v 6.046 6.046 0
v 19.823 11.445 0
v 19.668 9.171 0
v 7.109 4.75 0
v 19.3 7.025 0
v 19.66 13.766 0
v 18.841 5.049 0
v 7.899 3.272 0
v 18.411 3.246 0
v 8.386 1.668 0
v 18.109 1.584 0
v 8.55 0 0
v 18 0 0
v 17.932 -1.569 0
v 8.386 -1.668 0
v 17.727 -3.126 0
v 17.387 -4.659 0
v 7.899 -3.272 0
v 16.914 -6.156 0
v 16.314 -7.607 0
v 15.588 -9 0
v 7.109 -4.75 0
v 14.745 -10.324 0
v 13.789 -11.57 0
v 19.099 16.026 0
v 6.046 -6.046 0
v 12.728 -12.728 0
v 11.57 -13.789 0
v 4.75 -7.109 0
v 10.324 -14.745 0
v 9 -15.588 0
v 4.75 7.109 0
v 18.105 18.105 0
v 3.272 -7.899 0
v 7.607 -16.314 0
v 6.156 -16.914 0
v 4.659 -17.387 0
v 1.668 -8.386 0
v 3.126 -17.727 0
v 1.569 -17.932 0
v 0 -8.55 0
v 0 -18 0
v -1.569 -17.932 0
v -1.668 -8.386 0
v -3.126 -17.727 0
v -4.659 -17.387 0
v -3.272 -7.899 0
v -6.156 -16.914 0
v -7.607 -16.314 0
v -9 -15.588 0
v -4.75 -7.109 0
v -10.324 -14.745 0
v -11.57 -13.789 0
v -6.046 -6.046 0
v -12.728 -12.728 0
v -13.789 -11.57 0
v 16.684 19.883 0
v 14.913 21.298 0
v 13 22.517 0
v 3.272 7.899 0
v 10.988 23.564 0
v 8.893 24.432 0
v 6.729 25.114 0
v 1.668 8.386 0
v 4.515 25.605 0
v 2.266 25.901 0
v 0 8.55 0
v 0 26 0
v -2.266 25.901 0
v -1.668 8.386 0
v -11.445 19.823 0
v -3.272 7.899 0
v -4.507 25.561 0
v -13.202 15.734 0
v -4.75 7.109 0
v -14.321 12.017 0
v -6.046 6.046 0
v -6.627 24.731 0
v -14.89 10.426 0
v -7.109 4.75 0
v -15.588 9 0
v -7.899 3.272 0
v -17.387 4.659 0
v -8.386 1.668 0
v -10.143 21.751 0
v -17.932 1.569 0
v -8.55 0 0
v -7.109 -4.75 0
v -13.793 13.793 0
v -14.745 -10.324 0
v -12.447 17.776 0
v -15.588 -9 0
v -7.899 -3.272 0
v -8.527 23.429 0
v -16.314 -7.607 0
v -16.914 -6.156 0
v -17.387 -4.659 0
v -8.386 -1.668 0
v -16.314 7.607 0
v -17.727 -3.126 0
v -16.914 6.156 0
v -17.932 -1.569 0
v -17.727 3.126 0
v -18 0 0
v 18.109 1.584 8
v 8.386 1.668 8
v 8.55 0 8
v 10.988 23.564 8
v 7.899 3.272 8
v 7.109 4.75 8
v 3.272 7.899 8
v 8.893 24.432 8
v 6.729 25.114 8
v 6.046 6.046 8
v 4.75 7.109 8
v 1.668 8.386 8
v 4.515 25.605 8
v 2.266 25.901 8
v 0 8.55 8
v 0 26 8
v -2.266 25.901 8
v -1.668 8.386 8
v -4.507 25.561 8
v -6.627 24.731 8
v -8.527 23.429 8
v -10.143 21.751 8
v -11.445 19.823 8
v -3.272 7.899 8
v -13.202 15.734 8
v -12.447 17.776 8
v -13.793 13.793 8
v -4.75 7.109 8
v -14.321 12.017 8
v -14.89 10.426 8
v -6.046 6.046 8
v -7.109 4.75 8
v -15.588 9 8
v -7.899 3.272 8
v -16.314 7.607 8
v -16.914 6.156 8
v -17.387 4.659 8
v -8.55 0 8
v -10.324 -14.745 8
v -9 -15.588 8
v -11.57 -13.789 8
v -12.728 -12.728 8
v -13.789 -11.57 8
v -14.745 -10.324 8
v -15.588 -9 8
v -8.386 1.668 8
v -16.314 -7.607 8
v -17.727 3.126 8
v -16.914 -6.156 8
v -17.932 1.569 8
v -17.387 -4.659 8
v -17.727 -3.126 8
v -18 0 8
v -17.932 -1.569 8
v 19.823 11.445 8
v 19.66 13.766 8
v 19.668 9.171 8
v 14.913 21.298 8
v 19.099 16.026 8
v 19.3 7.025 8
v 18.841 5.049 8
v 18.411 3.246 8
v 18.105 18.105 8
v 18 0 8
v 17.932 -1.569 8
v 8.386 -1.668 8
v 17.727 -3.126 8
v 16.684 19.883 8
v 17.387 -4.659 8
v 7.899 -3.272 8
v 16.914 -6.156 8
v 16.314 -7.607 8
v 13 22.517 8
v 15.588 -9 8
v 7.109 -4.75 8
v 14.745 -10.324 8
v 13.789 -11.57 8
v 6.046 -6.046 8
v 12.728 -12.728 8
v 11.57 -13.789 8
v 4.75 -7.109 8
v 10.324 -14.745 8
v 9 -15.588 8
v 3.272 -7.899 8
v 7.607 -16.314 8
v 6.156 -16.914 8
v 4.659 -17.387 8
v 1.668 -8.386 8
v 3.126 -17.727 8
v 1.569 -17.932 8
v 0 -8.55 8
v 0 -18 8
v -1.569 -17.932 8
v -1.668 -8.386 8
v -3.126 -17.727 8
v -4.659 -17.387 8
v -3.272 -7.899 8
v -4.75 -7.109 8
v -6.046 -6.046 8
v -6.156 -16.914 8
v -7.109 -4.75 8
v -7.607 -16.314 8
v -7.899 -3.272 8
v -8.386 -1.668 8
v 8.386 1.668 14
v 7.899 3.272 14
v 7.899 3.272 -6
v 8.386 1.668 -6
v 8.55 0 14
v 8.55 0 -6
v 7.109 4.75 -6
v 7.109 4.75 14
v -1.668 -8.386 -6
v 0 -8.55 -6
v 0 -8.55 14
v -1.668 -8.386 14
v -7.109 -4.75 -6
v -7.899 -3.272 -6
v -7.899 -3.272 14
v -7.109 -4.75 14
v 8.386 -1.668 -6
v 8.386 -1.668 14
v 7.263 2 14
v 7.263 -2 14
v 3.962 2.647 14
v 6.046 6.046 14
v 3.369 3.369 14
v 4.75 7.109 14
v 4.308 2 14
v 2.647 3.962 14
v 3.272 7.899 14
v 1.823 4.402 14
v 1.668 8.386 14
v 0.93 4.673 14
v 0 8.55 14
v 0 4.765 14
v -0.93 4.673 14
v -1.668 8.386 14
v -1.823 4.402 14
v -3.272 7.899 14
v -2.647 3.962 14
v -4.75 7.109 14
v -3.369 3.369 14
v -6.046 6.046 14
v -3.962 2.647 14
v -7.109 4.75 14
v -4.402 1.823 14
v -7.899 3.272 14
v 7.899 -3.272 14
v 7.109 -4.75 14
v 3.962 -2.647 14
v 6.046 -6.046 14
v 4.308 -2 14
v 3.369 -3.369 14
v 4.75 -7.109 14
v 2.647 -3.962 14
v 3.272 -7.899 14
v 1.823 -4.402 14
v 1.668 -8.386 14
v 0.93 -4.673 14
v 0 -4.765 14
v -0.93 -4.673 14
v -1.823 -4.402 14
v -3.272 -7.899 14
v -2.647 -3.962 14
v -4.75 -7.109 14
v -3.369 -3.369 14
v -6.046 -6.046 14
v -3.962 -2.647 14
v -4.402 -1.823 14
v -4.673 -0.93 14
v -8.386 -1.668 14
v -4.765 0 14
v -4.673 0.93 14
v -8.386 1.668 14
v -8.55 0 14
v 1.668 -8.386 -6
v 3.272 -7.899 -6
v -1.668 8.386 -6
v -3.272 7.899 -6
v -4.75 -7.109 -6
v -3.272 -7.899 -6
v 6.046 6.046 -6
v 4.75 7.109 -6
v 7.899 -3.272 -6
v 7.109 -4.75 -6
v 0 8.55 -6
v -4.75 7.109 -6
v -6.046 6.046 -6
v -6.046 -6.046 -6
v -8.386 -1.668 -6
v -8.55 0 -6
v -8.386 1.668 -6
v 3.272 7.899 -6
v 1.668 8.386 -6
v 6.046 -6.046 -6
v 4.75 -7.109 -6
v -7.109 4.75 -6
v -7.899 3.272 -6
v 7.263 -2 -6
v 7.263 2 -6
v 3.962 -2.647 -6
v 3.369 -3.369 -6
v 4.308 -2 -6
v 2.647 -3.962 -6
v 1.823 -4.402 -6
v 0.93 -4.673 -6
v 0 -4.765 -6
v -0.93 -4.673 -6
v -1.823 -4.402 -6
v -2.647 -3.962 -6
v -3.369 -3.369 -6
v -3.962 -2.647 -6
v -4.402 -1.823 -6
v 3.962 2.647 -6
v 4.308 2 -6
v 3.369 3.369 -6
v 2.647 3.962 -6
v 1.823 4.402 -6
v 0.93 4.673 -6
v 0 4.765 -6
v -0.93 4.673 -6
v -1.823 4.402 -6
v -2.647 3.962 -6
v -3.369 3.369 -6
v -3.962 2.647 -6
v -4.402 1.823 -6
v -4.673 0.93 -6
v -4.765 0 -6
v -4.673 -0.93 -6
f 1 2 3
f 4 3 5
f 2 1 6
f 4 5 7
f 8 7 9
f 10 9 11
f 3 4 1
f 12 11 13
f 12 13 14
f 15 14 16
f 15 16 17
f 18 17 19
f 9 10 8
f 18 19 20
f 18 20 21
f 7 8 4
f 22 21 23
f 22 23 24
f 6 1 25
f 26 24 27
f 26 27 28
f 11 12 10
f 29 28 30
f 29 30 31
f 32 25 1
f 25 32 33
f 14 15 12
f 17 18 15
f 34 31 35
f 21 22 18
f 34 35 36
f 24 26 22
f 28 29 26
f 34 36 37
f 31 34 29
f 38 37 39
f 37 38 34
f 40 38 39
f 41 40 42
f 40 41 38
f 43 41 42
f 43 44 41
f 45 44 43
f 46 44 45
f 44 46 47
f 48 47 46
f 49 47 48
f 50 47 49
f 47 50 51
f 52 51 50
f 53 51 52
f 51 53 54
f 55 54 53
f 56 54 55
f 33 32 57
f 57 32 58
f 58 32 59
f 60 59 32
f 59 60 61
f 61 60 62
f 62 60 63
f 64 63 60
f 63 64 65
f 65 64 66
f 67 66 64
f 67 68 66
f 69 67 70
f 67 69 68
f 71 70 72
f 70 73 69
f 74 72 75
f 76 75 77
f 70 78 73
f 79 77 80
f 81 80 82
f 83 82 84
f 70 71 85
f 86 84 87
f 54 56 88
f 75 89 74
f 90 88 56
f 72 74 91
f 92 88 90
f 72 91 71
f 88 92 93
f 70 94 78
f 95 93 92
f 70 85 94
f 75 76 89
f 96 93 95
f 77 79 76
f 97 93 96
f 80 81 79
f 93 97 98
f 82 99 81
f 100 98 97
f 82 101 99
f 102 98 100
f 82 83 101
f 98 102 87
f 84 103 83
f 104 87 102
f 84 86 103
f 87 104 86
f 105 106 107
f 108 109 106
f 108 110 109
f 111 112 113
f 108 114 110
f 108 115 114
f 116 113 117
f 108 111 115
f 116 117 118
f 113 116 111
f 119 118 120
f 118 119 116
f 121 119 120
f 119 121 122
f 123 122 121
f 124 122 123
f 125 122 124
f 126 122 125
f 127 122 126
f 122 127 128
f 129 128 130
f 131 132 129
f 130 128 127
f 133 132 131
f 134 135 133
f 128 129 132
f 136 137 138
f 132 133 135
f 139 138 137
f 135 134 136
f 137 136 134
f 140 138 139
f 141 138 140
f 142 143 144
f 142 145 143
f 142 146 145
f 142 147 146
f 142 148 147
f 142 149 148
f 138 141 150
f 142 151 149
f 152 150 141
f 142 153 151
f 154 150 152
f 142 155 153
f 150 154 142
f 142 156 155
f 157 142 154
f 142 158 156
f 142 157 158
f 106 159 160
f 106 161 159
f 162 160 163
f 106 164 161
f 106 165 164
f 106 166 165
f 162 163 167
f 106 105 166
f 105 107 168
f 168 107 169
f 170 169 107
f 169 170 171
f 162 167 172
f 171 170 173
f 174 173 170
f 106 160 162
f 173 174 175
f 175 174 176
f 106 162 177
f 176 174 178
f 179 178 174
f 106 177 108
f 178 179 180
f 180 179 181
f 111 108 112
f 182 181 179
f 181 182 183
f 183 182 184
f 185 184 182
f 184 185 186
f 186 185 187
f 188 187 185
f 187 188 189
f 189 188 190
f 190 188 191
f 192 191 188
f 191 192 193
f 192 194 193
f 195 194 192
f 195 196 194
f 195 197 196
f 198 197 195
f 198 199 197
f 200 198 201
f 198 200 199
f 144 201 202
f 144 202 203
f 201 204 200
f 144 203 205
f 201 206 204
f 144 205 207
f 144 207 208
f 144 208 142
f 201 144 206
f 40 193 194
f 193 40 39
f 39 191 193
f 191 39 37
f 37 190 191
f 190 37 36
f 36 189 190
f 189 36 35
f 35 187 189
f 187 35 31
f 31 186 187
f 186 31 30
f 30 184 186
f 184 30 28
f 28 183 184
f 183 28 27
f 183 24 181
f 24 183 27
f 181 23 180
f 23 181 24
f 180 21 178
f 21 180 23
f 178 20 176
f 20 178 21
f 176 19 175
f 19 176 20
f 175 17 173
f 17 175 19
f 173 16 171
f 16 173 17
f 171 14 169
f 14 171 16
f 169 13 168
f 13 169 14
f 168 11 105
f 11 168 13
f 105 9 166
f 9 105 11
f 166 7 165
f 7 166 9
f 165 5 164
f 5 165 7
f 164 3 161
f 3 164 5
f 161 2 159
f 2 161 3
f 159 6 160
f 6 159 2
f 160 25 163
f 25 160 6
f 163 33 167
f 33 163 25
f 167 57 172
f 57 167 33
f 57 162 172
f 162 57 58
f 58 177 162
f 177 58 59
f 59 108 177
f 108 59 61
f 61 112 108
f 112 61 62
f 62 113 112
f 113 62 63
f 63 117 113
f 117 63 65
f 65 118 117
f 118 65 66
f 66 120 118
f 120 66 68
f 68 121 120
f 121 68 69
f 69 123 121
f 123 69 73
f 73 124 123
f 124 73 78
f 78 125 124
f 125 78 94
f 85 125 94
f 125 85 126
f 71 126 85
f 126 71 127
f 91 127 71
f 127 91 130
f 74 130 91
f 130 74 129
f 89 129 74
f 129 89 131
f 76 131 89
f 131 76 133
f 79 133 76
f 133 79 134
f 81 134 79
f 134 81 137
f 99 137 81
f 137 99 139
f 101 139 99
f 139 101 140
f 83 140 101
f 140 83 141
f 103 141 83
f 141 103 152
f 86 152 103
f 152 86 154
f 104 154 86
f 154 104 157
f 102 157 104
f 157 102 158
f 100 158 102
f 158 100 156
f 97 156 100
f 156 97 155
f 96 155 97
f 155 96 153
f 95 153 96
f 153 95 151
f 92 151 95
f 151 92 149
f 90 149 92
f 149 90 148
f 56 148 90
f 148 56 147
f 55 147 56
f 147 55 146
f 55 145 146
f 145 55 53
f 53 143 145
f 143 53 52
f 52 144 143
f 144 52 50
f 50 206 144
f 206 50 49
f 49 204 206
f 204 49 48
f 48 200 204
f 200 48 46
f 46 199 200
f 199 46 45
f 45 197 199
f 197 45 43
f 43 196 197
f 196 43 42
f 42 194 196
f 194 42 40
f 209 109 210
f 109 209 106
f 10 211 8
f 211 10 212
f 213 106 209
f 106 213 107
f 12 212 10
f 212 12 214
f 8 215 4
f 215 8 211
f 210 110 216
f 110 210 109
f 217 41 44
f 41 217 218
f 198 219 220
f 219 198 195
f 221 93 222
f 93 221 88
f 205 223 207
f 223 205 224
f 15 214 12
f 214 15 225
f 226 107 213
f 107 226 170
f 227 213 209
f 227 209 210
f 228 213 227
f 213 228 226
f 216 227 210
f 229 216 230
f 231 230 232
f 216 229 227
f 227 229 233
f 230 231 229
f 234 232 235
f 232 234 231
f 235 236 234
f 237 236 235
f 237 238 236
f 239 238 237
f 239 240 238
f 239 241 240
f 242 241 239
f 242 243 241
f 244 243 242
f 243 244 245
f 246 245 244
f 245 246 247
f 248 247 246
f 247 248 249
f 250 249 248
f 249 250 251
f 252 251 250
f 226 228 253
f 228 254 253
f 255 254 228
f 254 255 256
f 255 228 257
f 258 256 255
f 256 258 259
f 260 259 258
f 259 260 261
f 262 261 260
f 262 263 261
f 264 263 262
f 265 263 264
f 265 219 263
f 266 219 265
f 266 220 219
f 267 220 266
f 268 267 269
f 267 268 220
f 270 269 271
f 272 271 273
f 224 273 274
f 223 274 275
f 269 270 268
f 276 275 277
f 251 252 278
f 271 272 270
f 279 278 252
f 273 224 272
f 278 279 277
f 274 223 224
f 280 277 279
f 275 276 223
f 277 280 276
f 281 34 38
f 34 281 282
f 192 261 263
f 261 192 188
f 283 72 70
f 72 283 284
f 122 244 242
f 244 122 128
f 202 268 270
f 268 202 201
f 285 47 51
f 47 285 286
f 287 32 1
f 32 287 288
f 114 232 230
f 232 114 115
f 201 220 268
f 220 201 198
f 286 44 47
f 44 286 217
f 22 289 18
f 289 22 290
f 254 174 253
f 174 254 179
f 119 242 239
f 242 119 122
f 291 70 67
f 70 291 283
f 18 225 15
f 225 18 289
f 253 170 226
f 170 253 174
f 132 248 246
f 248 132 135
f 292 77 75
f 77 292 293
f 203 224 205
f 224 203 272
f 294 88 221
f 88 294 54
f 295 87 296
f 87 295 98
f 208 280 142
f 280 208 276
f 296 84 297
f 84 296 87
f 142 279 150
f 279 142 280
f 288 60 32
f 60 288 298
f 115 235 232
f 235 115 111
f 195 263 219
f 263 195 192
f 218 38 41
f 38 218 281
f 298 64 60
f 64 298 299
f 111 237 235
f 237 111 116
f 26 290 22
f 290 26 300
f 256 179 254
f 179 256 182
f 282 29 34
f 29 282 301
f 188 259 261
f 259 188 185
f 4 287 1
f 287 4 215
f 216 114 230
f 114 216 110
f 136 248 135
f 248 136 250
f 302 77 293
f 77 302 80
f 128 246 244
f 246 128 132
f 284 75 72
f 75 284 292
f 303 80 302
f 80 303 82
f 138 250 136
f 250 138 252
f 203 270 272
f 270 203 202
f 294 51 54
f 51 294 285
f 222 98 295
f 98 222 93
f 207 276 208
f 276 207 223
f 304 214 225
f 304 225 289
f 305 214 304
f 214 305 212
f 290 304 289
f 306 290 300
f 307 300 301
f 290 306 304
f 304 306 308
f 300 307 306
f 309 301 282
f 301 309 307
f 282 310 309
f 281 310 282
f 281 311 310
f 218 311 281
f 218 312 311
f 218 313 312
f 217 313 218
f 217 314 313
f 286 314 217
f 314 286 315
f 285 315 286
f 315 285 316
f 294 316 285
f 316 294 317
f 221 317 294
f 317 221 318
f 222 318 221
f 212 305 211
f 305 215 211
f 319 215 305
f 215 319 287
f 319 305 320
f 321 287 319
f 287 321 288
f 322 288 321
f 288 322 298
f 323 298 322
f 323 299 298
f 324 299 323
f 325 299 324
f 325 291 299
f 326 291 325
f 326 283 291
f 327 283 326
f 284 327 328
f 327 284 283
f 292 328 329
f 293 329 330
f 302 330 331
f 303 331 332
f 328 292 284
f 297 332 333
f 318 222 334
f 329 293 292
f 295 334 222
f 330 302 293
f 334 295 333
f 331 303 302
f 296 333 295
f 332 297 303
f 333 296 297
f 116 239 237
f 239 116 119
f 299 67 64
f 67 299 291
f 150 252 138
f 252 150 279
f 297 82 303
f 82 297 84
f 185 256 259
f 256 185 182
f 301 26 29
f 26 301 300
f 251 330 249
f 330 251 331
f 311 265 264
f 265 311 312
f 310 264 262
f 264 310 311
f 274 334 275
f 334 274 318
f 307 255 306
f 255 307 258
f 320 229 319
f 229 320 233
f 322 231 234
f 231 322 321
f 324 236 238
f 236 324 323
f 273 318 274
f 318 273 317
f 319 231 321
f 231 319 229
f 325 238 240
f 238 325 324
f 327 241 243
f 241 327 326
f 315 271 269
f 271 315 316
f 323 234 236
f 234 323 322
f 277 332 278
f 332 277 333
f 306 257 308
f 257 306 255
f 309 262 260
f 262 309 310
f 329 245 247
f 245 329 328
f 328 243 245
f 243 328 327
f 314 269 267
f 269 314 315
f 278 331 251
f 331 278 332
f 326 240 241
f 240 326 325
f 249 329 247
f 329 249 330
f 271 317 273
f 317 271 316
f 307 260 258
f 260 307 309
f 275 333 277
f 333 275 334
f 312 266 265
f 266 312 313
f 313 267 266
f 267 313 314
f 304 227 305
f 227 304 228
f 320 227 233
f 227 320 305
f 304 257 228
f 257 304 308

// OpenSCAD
$fn = 32;

// ----------------------------------------------------------------------
// Cam: base radius 18 mm with a 8 mm lift over 150 degrees
// ----------------------------------------------------------------------

// --- parameters (mm) ---
base_r = 18;              // base radius
lift = 8;                 // lift height above the base radius
lift_span = 150;          // angular width of the lift
lift_start = 0;           // angle where the lift starts
cam_t = 8;                // cam plate thickness
hub_d = 17.1;             // hub diameter
hub_h = 20;               // hub height
bore_d = 9.53;            // bore
key_w = 4;                // keyway width
key_depth = 1.79;         // keyway depth

cam_profile = [[18, 0], [18.109, 1.584], [18.411, 3.246], [18.841, 5.049], [19.3, 7.025], [19.668, 9.171], [19.823, 11.445], [19.66, 13.766], [19.099, 16.026], [18.105, 18.105], [16.684, 19.883], [14.913, 21.298], [13, 22.517], [10.988, 23.564], [8.893, 24.432], [6.729, 25.114], [4.515, 25.605], [2.266, 25.901], [0, 26], [-2.266, 25.901], [-4.507, 25.561], [-6.627, 24.731], [-8.527, 23.429], [-10.143, 21.751], [-11.445, 19.823], [-12.447, 17.776], [-13.202, 15.734], [-13.793, 13.793], [-14.321, 12.017], [-14.89, 10.426], [-15.588, 9], [-16.314, 7.607], [-16.914, 6.156], [-17.387, 4.659], [-17.727, 3.126], [-17.932, 1.569], [-18, 0], [-17.932, -1.569], [-17.727, -3.126], [-17.387, -4.659], [-16.914, -6.156], [-16.314, -7.607], [-15.588, -9], [-14.745, -10.324], [-13.789, -11.57], [-12.728, -12.728], [-11.57, -13.789], [-10.324, -14.745], [-9, -15.588], [-7.607, -16.314], [-6.156, -16.914], [-4.659, -17.387], [-3.126, -17.727], [-1.569, -17.932], [0, -18], [1.569, -17.932], [3.126, -17.727], [4.659, -17.387], [6.156, -16.914], [7.607, -16.314], [9, -15.588], [10.324, -14.745], [11.57, -13.789], [12.728, -12.728], [13.789, -11.57], [14.745, -10.324], [15.588, -9], [16.314, -7.607], [16.914, -6.156], [17.387, -4.659], [17.727, -3.126], [17.932, -1.569]];

difference() {
  union() {
    linear_extrude(height = cam_t) polygon(cam_profile);
    /* hub, proud of the cam plate on both sides */
    translate([0, 0, -6]) cylinder(h = hub_h, d = hub_d);
  }
  /* bore through the hub, 2.5 mm clear on both faces */
  translate([0, 0, -8.5]) cylinder(h = hub_h + 5, d = bore_d);
  /* keyway, milled through the whole hub */
  translate([2.973, -2, -8.5]) cube([4.29, 4, 25]);
}
